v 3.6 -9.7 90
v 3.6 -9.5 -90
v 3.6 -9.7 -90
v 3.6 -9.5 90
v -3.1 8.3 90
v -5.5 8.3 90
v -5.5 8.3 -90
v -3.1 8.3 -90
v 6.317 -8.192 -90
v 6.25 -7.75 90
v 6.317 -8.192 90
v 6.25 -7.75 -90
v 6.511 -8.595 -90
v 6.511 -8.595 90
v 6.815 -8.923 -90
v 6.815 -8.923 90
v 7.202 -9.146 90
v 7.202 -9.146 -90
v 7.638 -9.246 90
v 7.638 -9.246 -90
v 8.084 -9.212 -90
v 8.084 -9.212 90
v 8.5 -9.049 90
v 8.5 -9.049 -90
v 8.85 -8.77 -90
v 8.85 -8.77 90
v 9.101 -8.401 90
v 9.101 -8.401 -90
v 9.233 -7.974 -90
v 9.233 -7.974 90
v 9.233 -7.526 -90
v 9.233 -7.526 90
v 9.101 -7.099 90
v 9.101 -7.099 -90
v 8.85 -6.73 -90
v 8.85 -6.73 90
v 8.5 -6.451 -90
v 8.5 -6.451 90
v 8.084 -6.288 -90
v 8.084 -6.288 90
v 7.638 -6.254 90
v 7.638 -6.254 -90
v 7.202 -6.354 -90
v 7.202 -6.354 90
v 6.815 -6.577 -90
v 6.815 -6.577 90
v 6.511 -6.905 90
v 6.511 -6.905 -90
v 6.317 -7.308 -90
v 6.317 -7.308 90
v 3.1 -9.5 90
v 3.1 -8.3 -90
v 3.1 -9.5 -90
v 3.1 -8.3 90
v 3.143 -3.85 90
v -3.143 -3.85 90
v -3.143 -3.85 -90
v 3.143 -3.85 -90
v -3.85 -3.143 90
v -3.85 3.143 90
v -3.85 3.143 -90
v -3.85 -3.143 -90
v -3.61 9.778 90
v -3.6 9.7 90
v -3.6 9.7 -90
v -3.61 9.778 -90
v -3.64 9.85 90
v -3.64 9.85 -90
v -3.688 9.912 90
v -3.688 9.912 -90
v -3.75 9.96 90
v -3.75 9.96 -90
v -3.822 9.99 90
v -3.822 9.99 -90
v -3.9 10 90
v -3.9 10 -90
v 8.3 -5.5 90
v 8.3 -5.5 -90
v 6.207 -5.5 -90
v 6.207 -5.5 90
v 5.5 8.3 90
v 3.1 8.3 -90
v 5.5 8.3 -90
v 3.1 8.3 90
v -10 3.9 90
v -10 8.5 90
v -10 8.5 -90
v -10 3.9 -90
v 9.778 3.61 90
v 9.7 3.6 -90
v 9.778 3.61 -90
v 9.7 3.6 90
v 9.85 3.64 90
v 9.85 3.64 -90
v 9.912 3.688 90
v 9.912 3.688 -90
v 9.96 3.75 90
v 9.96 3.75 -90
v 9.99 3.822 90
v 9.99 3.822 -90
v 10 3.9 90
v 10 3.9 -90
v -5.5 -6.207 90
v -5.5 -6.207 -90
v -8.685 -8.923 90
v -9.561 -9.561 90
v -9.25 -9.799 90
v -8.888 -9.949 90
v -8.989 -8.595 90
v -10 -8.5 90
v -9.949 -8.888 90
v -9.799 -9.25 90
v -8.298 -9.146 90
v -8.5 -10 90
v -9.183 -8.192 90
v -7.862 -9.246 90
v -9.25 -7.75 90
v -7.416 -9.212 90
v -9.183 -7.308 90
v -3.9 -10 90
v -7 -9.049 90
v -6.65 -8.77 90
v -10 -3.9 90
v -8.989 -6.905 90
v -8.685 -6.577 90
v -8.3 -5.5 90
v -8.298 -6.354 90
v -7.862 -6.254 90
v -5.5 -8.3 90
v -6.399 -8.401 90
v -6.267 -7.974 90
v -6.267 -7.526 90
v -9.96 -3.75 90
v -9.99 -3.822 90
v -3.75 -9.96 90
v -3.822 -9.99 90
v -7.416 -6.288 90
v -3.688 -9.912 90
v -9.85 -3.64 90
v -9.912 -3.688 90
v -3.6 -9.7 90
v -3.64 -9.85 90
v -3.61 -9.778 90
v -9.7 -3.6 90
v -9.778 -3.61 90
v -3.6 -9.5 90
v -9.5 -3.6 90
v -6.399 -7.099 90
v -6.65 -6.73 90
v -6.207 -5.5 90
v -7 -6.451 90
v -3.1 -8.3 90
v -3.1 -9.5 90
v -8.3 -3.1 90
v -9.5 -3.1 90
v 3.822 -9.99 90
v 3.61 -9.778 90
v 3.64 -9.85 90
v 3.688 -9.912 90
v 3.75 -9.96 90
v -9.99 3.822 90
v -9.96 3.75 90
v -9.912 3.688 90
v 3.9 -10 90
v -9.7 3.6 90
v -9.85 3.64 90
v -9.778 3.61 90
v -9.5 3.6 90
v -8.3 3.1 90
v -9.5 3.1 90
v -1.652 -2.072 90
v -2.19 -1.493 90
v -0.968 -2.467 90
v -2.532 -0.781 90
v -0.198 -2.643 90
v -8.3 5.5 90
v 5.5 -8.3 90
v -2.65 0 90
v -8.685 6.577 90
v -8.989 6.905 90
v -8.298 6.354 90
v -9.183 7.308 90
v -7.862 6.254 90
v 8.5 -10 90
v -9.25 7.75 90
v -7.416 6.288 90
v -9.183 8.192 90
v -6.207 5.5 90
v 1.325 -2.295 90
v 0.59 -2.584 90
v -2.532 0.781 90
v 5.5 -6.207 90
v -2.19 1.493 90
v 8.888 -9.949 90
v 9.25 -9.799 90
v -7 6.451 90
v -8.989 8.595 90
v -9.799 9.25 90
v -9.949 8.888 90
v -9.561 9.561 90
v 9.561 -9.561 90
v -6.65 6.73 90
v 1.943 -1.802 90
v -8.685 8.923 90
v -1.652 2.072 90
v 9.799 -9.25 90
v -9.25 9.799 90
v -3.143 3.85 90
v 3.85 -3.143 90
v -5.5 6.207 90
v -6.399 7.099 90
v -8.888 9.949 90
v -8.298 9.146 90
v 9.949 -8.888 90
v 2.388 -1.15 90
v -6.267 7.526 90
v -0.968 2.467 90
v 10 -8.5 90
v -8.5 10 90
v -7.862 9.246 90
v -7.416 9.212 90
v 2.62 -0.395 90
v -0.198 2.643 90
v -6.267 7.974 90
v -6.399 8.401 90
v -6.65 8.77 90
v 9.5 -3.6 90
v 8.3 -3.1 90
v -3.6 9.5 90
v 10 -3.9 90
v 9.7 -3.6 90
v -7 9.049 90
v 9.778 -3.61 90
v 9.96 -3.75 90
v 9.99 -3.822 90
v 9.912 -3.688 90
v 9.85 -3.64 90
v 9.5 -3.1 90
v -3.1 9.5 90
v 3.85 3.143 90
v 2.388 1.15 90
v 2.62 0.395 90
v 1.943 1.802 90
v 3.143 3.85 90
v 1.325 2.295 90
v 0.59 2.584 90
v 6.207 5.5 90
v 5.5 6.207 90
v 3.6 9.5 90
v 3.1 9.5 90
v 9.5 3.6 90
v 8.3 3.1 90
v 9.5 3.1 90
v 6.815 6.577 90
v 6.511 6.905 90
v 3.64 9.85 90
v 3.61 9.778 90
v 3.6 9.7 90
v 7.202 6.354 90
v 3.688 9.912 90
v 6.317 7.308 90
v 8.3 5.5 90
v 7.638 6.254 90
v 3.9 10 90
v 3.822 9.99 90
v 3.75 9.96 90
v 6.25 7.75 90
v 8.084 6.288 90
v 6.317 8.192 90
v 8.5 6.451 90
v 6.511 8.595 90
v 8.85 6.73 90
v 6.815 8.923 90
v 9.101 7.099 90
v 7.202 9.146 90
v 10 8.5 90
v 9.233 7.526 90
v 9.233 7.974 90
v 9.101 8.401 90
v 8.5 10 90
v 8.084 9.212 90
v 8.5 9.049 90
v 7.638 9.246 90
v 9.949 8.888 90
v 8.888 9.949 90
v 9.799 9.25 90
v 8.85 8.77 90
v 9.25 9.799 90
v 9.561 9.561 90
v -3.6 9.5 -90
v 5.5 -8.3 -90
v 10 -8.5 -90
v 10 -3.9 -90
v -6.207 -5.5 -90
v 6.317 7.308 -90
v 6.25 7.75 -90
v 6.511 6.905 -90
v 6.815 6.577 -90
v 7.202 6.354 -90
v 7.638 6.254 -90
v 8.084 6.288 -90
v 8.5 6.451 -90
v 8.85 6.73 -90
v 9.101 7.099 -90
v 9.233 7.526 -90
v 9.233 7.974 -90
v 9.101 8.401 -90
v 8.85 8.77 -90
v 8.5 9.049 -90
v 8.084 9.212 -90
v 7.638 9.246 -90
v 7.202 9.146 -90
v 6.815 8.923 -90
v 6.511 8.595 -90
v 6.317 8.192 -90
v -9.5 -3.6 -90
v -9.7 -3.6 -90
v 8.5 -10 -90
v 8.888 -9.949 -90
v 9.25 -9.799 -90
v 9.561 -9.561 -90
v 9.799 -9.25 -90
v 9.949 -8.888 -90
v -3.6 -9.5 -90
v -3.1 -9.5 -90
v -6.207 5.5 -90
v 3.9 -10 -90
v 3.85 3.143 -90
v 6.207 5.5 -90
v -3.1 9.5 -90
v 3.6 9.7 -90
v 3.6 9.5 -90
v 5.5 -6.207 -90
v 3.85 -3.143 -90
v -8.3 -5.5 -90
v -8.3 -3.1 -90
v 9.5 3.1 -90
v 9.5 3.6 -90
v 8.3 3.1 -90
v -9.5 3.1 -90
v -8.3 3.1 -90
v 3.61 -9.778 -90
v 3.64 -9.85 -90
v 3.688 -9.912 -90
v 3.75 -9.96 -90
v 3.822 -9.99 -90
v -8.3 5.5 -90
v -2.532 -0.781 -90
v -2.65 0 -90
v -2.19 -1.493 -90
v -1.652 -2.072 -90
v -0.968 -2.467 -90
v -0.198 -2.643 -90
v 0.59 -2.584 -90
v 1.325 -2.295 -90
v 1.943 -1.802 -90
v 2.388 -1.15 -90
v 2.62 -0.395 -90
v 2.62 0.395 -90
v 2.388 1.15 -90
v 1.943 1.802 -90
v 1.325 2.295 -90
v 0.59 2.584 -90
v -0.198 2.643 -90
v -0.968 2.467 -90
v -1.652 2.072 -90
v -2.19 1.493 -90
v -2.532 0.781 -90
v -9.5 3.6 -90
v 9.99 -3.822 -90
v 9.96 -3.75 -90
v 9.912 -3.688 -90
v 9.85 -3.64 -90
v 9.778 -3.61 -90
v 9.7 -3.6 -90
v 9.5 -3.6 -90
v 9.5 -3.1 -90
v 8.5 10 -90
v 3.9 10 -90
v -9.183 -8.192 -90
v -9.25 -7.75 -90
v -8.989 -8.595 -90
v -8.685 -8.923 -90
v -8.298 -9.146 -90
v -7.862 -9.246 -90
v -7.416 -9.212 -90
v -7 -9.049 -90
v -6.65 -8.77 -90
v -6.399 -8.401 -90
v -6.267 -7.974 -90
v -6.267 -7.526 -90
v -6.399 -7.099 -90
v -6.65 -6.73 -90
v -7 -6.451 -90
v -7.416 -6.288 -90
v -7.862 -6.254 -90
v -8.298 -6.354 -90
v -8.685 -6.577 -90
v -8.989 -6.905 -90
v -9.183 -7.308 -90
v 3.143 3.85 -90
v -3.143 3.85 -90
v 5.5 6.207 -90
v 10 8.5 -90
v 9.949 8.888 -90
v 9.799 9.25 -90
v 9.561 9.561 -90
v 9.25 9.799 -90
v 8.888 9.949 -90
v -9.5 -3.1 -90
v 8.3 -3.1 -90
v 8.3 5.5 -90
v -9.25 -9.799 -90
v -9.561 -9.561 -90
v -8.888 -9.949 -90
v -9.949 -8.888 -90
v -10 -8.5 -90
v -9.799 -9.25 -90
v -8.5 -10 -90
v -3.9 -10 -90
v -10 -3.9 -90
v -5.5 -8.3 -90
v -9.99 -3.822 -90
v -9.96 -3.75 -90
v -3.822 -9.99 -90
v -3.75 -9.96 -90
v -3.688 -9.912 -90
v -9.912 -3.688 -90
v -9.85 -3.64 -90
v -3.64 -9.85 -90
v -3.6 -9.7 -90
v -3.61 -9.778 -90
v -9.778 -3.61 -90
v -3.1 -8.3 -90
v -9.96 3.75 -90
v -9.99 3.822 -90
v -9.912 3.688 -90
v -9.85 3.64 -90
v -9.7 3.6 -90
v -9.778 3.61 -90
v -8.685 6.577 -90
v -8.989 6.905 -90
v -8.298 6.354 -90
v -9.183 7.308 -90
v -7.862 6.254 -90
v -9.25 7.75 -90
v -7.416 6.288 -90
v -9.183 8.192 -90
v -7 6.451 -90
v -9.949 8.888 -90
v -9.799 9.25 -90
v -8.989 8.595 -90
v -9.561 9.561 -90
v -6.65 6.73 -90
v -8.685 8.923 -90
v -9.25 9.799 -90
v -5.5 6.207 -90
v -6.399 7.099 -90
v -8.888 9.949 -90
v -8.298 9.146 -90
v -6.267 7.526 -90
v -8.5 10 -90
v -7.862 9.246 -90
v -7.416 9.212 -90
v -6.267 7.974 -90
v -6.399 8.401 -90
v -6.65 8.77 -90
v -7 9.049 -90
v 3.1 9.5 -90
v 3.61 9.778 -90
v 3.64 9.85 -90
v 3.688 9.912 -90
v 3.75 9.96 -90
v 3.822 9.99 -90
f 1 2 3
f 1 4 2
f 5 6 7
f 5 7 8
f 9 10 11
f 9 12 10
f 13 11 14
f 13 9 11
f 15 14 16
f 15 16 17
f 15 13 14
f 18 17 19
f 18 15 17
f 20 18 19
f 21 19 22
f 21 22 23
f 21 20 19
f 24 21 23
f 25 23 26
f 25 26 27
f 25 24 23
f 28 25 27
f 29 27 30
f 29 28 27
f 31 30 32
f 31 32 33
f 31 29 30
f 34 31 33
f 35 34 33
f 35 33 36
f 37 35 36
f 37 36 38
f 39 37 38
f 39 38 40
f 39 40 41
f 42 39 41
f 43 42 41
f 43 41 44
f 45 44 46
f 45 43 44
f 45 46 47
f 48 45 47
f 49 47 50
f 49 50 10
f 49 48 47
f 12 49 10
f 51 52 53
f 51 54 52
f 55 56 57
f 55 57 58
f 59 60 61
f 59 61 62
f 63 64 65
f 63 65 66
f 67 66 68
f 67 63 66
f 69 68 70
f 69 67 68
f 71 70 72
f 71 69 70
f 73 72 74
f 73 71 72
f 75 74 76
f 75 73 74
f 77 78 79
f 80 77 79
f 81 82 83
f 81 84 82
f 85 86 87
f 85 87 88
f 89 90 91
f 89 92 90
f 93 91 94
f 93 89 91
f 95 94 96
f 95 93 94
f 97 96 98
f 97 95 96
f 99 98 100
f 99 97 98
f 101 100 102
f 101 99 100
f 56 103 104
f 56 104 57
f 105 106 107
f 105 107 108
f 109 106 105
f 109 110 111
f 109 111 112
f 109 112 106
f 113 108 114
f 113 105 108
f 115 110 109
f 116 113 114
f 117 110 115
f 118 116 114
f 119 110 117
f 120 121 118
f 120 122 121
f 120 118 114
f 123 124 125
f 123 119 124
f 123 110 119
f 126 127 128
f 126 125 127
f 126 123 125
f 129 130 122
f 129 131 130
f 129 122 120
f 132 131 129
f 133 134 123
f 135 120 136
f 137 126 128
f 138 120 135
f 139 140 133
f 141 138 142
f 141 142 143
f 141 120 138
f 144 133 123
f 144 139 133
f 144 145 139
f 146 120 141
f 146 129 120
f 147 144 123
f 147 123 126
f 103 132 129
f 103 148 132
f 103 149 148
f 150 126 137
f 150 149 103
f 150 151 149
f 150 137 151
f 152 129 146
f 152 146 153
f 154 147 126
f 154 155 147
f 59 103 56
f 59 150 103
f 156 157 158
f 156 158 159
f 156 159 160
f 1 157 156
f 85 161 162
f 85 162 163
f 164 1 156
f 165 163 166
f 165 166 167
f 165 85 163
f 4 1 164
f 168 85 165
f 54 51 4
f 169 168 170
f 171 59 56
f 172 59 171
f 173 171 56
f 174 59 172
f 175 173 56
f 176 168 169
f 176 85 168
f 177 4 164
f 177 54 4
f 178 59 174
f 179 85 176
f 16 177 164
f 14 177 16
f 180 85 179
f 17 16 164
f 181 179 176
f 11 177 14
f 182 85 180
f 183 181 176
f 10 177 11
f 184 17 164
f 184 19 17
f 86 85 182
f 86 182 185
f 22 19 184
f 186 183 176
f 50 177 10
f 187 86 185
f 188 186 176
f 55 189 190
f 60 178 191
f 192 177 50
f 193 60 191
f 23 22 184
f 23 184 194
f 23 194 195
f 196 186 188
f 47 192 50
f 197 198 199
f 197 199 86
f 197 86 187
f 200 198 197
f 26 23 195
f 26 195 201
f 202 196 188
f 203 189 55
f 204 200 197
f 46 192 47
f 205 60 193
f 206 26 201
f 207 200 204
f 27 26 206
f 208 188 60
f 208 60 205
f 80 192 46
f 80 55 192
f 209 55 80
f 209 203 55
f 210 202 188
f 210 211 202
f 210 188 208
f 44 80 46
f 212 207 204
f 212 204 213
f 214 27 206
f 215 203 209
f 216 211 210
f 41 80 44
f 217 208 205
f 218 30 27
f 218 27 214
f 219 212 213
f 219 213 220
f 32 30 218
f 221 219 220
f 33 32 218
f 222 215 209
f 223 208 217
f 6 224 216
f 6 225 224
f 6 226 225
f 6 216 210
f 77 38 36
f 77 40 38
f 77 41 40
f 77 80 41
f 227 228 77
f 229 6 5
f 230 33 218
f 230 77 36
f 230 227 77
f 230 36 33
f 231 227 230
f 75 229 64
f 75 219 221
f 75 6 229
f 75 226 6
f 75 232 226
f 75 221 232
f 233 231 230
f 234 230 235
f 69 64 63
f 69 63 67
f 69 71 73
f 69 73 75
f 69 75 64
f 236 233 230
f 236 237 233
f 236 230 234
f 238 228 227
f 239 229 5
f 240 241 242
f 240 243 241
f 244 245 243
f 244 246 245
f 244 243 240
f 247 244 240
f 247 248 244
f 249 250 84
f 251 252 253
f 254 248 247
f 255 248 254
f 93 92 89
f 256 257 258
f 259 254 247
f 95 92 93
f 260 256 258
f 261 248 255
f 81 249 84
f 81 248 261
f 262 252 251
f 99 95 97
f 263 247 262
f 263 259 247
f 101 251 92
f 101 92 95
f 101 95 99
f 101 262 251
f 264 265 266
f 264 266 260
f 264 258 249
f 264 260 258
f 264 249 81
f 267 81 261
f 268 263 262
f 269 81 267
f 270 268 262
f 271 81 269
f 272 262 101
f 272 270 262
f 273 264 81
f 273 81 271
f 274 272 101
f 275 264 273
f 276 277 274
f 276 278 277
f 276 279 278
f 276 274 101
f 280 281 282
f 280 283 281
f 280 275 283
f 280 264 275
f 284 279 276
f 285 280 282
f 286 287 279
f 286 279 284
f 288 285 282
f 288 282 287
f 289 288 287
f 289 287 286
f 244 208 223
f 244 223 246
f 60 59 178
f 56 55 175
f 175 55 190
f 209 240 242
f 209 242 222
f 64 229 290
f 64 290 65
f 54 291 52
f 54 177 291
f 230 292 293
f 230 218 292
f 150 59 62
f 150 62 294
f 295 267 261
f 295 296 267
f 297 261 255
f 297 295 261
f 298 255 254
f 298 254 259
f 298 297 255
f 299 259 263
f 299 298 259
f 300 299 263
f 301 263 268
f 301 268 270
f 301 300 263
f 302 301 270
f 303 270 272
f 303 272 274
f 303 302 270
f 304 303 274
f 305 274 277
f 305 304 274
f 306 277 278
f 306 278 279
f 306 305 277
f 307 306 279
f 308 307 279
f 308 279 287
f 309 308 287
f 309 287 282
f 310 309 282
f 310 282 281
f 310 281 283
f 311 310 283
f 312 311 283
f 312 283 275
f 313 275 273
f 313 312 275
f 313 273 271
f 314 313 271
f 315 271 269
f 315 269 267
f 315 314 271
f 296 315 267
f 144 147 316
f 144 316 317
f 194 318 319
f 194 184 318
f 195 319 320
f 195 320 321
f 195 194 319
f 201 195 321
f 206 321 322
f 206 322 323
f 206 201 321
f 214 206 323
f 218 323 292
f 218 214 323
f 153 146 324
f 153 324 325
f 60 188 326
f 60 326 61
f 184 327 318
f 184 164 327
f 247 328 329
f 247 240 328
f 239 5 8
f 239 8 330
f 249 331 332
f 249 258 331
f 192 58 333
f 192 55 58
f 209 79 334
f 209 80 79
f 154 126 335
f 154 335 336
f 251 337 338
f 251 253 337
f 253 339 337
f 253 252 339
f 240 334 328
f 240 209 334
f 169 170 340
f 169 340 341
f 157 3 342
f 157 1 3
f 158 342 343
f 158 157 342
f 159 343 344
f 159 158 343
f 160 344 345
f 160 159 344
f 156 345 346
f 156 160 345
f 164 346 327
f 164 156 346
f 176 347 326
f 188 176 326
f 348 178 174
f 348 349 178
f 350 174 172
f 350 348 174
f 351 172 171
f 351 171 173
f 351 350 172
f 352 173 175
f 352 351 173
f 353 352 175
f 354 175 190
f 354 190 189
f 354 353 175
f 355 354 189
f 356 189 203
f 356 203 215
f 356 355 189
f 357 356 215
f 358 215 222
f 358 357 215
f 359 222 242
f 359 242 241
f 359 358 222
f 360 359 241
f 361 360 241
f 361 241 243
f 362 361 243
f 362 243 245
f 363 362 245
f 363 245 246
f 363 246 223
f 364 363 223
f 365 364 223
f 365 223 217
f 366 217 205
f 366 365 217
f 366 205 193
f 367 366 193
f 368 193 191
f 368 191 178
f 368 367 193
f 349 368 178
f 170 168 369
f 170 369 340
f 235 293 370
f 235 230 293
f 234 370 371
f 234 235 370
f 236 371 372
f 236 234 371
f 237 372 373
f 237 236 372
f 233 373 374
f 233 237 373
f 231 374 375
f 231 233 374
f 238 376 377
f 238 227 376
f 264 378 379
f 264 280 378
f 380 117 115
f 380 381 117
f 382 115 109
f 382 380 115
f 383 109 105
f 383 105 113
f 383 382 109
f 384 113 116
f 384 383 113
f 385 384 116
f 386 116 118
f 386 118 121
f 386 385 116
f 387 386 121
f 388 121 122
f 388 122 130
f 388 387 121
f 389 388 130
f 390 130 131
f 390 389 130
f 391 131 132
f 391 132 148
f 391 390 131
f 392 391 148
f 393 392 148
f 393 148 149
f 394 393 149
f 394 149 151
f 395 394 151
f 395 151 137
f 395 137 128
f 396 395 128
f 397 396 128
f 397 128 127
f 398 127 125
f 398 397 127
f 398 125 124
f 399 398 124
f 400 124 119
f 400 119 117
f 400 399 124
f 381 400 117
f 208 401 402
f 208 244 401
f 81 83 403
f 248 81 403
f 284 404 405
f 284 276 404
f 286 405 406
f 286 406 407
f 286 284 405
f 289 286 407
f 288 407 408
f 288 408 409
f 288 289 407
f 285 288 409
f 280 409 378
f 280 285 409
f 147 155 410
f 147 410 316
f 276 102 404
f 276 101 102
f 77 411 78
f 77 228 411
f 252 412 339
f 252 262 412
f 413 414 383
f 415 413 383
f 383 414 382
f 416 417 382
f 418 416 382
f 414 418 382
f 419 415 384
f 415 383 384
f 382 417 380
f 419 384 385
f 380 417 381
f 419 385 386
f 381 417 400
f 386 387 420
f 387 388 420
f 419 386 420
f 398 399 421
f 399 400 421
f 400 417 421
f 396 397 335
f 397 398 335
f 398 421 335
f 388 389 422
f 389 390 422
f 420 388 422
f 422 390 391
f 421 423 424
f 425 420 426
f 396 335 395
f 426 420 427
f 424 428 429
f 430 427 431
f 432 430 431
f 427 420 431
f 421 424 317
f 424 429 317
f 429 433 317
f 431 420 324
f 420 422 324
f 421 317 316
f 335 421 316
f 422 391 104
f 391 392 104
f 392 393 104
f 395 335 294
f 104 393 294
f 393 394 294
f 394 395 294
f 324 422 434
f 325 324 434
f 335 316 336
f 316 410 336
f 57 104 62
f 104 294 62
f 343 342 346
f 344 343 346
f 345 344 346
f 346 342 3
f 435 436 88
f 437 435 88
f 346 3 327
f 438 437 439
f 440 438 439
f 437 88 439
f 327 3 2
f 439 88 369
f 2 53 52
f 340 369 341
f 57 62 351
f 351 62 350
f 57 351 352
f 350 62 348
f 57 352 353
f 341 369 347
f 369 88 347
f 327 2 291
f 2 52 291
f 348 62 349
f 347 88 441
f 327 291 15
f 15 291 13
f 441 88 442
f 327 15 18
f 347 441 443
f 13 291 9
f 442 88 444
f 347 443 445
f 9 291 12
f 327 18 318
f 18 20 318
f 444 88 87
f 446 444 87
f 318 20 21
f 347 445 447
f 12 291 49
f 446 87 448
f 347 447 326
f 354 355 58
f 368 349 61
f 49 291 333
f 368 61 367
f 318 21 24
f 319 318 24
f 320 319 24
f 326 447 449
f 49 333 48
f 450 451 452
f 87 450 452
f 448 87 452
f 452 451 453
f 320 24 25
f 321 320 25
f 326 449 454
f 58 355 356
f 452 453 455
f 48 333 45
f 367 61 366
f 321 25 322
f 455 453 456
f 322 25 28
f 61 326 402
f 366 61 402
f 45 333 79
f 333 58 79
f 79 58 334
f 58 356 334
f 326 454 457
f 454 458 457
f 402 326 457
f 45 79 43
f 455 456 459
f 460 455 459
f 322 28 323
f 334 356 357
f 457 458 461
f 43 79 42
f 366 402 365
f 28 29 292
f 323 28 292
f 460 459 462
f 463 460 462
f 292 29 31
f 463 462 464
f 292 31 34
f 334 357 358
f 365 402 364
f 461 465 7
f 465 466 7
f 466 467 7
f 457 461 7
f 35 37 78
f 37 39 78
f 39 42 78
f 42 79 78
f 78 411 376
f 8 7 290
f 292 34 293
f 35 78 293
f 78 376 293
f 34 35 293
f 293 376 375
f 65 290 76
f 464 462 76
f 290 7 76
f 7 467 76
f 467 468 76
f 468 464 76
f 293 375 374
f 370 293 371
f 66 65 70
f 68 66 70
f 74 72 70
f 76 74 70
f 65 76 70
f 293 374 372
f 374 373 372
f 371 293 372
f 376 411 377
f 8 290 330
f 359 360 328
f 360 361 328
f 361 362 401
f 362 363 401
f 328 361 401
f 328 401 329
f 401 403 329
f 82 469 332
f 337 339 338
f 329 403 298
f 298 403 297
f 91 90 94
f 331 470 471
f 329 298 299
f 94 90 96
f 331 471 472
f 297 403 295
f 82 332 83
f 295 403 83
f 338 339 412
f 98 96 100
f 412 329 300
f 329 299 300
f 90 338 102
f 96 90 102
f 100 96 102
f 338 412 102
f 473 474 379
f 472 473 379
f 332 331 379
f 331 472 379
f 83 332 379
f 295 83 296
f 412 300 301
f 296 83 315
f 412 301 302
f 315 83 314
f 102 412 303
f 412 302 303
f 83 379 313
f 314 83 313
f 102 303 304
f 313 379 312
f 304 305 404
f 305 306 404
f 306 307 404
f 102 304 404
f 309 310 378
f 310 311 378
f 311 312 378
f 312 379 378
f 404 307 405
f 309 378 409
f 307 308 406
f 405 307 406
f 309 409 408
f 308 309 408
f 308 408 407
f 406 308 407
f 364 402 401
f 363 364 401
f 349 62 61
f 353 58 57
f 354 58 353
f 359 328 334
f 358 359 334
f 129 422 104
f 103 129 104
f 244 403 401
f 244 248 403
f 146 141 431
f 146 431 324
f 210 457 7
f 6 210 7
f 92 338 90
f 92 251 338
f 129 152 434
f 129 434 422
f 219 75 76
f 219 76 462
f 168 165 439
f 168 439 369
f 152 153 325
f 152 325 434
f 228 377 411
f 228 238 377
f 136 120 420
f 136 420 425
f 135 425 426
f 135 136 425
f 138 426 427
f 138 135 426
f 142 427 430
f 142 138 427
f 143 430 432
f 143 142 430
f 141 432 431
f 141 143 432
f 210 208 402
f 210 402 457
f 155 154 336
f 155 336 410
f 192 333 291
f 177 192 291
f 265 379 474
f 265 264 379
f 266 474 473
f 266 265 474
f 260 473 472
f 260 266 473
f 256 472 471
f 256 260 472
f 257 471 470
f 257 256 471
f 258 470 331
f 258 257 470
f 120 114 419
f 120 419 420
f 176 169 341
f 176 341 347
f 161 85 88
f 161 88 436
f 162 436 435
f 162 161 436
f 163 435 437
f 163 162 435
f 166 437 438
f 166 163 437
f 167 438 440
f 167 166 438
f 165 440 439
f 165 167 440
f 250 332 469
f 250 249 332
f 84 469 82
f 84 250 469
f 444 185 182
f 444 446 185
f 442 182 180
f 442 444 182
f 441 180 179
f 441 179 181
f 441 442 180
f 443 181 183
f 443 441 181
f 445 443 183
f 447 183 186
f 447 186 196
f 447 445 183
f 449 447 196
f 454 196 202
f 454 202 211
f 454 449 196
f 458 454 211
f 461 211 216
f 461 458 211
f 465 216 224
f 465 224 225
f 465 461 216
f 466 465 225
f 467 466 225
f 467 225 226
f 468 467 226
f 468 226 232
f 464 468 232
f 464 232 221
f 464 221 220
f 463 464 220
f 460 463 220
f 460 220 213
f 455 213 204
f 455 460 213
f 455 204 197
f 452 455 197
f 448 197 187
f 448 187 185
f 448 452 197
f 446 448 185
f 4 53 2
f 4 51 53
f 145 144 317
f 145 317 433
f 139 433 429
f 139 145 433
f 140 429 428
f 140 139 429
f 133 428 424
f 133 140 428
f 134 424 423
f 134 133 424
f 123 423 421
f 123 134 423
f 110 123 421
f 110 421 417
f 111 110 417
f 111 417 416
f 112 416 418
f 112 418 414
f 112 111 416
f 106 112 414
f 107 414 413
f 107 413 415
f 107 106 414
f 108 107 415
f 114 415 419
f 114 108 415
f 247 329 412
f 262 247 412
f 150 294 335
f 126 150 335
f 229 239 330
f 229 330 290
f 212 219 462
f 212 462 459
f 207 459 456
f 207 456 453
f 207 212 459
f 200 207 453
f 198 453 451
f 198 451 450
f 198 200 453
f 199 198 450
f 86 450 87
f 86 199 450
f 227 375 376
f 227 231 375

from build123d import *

# Parameters (mm, degrees)
SKETCH_1_R      = 2.65
SKETCH_1_R_2    = 1.5
EXTRUDE_1_DEPTH = 90


with BuildPart() as part:
    # 草图1 → 凸台-拉伸1 (new, symmetric)
    with BuildSketch(Plane.XY):
        with BuildLine():
            Line((3.142893219, 3.85), (-3.142893219, 3.85))
            Line((-3.142893219, 3.85), (-5.5, 6.207106781))
            Line((-5.5, 6.207106781), (-5.5, 8.3))
            Line((-5.5, 8.3), (-3.1, 8.3))
            Line((-3.1, 8.3), (-3.1, 9.5))
            Line((-3.1, 9.5), (-3.6, 9.5))
            Line((-3.6, 9.5), (-3.6, 9.7))
            ThreePointArc((-3.6, 9.7), (-3.687867966, 9.912132034), (-3.9, 10))
            Line((-3.9, 10), (-8.5, 10))
            ThreePointArc((-8.5, 10), (-9.560660172, 9.560660172), (-10, 8.5))
            Line((-10, 8.5), (-10, 3.9))
            ThreePointArc((-10, 3.9), (-9.912132034, 3.687867966), (-9.7, 3.6))
            Line((-9.7, 3.6), (-9.5, 3.6))
            Line((-9.5, 3.6), (-9.5, 3.1))
            Line((-9.5, 3.1), (-8.3, 3.1))
            Line((-8.3, 3.1), (-8.3, 5.5))
            Line((-8.3, 5.5), (-6.207106781, 5.5))
            Line((-6.207106781, 5.5), (-3.85, 3.142893219))
            Line((-3.85, 3.142893219), (-3.85, -3.142893219))
            Line((-3.85, -3.142893219), (-6.207106781, -5.5))
            Line((-6.207106781, -5.5), (-8.3, -5.5))
            Line((-8.3, -5.5), (-8.3, -3.1))
            Line((-8.3, -3.1), (-9.5, -3.1))
            Line((-9.5, -3.1), (-9.5, -3.6))
            Line((-9.5, -3.6), (-9.7, -3.6))
            ThreePointArc((-9.7, -3.6), (-9.912132034, -3.687867966), (-10, -3.9))
            Line((-10, -3.9), (-10, -8.5))
            ThreePointArc((-10, -8.5), (-9.560660172, -9.560660172), (-8.5, -10))
            Line((-8.5, -10), (-3.9, -10))
            ThreePointArc((-3.9, -10), (-3.687867966, -9.912132034), (-3.6, -9.7))
            Line((-3.6, -9.7), (-3.6, -9.5))
            Line((-3.6, -9.5), (-3.1, -9.5))
            Line((-3.1, -9.5), (-3.1, -8.3))
            Line((-3.1, -8.3), (-5.5, -8.3))
            Line((-5.5, -8.3), (-5.5, -6.207106781))
            Line((-5.5, -6.207106781), (-3.142893219, -3.85))
            Line((-3.142893219, -3.85), (3.142893219, -3.85))
            Line((3.142893219, -3.85), (5.5, -6.207106781))
            Line((5.5, -6.207106781), (5.5, -8.3))
            Line((5.5, -8.3), (3.1, -8.3))
            Line((3.1, -8.3), (3.1, -9.5))
            Line((3.1, -9.5), (3.6, -9.5))
            Line((3.6, -9.5), (3.6, -9.7))
            ThreePointArc((3.6, -9.7), (3.687867966, -9.912132034), (3.9, -10))
            Line((3.9, -10), (8.5, -10))
            ThreePointArc((8.5, -10), (9.560660172, -9.560660172), (10, -8.5))
            Line((10, -8.5), (10, -3.9))
            ThreePointArc((10, -3.9), (9.912132034, -3.687867966), (9.7, -3.6))
            Line((9.7, -3.6), (9.5, -3.6))
            Line((9.5, -3.6), (9.5, -3.1))
            Line((9.5, -3.1), (8.3, -3.1))
            Line((8.3, -3.1), (8.3, -5.5))
            Line((8.3, -5.5), (6.207106781, -5.5))
            Line((6.207106781, -5.5), (3.85, -3.142893219))
            Line((3.85, -3.142893219), (3.85, 3.142893219))
            Line((3.85, 3.142893219), (6.207106781, 5.5))
            Line((6.207106781, 5.5), (8.3, 5.5))
            Line((8.3, 5.5), (8.3, 3.1))
            Line((8.3, 3.1), (9.5, 3.1))
            Line((9.5, 3.1), (9.5, 3.6))
            Line((9.5, 3.6), (9.7, 3.6))
            ThreePointArc((9.7, 3.6), (9.912132034, 3.687867966), (10, 3.9))
            Line((10, 3.9), (10, 8.5))
            ThreePointArc((10, 8.5), (9.560660172, 9.560660172), (8.5, 10))
            Line((8.5, 10), (3.9, 10))
            ThreePointArc((3.9, 10), (3.687867966, 9.912132034), (3.6, 9.7))
            Line((3.6, 9.7), (3.6, 9.5))
            Line((3.6, 9.5), (3.1, 9.5))
            Line((3.1, 9.5), (3.1, 8.3))
            Line((3.1, 8.3), (5.5, 8.3))
            Line((5.5, 8.3), (5.5, 6.207106781))
            Line((5.5, 6.207106781), (3.142893219, 3.85))
        make_face()
        with Locations(Location((0, 0, 0), (0, 0, 180))):
            Circle(SKETCH_1_R, mode=Mode.SUBTRACT)
        with Locations(Location((-7.75, 7.75, 0), (0, 0, 180))):
            Circle(SKETCH_1_R_2, mode=Mode.SUBTRACT)
        with Locations(Location((7.75, 7.75, 0), (0, 0, 180))):
            Circle(SKETCH_1_R_2, mode=Mode.SUBTRACT)
        with Locations(Location((7.75, -7.75, 0), (0, 0, 180))):
            Circle(SKETCH_1_R_2, mode=Mode.SUBTRACT)
        with Locations(Location((-7.75, -7.75, 0), (0, 0, 180))):
            Circle(SKETCH_1_R_2, mode=Mode.SUBTRACT)
    extrude(amount=EXTRUDE_1_DEPTH, both=True)


solid = part.part
